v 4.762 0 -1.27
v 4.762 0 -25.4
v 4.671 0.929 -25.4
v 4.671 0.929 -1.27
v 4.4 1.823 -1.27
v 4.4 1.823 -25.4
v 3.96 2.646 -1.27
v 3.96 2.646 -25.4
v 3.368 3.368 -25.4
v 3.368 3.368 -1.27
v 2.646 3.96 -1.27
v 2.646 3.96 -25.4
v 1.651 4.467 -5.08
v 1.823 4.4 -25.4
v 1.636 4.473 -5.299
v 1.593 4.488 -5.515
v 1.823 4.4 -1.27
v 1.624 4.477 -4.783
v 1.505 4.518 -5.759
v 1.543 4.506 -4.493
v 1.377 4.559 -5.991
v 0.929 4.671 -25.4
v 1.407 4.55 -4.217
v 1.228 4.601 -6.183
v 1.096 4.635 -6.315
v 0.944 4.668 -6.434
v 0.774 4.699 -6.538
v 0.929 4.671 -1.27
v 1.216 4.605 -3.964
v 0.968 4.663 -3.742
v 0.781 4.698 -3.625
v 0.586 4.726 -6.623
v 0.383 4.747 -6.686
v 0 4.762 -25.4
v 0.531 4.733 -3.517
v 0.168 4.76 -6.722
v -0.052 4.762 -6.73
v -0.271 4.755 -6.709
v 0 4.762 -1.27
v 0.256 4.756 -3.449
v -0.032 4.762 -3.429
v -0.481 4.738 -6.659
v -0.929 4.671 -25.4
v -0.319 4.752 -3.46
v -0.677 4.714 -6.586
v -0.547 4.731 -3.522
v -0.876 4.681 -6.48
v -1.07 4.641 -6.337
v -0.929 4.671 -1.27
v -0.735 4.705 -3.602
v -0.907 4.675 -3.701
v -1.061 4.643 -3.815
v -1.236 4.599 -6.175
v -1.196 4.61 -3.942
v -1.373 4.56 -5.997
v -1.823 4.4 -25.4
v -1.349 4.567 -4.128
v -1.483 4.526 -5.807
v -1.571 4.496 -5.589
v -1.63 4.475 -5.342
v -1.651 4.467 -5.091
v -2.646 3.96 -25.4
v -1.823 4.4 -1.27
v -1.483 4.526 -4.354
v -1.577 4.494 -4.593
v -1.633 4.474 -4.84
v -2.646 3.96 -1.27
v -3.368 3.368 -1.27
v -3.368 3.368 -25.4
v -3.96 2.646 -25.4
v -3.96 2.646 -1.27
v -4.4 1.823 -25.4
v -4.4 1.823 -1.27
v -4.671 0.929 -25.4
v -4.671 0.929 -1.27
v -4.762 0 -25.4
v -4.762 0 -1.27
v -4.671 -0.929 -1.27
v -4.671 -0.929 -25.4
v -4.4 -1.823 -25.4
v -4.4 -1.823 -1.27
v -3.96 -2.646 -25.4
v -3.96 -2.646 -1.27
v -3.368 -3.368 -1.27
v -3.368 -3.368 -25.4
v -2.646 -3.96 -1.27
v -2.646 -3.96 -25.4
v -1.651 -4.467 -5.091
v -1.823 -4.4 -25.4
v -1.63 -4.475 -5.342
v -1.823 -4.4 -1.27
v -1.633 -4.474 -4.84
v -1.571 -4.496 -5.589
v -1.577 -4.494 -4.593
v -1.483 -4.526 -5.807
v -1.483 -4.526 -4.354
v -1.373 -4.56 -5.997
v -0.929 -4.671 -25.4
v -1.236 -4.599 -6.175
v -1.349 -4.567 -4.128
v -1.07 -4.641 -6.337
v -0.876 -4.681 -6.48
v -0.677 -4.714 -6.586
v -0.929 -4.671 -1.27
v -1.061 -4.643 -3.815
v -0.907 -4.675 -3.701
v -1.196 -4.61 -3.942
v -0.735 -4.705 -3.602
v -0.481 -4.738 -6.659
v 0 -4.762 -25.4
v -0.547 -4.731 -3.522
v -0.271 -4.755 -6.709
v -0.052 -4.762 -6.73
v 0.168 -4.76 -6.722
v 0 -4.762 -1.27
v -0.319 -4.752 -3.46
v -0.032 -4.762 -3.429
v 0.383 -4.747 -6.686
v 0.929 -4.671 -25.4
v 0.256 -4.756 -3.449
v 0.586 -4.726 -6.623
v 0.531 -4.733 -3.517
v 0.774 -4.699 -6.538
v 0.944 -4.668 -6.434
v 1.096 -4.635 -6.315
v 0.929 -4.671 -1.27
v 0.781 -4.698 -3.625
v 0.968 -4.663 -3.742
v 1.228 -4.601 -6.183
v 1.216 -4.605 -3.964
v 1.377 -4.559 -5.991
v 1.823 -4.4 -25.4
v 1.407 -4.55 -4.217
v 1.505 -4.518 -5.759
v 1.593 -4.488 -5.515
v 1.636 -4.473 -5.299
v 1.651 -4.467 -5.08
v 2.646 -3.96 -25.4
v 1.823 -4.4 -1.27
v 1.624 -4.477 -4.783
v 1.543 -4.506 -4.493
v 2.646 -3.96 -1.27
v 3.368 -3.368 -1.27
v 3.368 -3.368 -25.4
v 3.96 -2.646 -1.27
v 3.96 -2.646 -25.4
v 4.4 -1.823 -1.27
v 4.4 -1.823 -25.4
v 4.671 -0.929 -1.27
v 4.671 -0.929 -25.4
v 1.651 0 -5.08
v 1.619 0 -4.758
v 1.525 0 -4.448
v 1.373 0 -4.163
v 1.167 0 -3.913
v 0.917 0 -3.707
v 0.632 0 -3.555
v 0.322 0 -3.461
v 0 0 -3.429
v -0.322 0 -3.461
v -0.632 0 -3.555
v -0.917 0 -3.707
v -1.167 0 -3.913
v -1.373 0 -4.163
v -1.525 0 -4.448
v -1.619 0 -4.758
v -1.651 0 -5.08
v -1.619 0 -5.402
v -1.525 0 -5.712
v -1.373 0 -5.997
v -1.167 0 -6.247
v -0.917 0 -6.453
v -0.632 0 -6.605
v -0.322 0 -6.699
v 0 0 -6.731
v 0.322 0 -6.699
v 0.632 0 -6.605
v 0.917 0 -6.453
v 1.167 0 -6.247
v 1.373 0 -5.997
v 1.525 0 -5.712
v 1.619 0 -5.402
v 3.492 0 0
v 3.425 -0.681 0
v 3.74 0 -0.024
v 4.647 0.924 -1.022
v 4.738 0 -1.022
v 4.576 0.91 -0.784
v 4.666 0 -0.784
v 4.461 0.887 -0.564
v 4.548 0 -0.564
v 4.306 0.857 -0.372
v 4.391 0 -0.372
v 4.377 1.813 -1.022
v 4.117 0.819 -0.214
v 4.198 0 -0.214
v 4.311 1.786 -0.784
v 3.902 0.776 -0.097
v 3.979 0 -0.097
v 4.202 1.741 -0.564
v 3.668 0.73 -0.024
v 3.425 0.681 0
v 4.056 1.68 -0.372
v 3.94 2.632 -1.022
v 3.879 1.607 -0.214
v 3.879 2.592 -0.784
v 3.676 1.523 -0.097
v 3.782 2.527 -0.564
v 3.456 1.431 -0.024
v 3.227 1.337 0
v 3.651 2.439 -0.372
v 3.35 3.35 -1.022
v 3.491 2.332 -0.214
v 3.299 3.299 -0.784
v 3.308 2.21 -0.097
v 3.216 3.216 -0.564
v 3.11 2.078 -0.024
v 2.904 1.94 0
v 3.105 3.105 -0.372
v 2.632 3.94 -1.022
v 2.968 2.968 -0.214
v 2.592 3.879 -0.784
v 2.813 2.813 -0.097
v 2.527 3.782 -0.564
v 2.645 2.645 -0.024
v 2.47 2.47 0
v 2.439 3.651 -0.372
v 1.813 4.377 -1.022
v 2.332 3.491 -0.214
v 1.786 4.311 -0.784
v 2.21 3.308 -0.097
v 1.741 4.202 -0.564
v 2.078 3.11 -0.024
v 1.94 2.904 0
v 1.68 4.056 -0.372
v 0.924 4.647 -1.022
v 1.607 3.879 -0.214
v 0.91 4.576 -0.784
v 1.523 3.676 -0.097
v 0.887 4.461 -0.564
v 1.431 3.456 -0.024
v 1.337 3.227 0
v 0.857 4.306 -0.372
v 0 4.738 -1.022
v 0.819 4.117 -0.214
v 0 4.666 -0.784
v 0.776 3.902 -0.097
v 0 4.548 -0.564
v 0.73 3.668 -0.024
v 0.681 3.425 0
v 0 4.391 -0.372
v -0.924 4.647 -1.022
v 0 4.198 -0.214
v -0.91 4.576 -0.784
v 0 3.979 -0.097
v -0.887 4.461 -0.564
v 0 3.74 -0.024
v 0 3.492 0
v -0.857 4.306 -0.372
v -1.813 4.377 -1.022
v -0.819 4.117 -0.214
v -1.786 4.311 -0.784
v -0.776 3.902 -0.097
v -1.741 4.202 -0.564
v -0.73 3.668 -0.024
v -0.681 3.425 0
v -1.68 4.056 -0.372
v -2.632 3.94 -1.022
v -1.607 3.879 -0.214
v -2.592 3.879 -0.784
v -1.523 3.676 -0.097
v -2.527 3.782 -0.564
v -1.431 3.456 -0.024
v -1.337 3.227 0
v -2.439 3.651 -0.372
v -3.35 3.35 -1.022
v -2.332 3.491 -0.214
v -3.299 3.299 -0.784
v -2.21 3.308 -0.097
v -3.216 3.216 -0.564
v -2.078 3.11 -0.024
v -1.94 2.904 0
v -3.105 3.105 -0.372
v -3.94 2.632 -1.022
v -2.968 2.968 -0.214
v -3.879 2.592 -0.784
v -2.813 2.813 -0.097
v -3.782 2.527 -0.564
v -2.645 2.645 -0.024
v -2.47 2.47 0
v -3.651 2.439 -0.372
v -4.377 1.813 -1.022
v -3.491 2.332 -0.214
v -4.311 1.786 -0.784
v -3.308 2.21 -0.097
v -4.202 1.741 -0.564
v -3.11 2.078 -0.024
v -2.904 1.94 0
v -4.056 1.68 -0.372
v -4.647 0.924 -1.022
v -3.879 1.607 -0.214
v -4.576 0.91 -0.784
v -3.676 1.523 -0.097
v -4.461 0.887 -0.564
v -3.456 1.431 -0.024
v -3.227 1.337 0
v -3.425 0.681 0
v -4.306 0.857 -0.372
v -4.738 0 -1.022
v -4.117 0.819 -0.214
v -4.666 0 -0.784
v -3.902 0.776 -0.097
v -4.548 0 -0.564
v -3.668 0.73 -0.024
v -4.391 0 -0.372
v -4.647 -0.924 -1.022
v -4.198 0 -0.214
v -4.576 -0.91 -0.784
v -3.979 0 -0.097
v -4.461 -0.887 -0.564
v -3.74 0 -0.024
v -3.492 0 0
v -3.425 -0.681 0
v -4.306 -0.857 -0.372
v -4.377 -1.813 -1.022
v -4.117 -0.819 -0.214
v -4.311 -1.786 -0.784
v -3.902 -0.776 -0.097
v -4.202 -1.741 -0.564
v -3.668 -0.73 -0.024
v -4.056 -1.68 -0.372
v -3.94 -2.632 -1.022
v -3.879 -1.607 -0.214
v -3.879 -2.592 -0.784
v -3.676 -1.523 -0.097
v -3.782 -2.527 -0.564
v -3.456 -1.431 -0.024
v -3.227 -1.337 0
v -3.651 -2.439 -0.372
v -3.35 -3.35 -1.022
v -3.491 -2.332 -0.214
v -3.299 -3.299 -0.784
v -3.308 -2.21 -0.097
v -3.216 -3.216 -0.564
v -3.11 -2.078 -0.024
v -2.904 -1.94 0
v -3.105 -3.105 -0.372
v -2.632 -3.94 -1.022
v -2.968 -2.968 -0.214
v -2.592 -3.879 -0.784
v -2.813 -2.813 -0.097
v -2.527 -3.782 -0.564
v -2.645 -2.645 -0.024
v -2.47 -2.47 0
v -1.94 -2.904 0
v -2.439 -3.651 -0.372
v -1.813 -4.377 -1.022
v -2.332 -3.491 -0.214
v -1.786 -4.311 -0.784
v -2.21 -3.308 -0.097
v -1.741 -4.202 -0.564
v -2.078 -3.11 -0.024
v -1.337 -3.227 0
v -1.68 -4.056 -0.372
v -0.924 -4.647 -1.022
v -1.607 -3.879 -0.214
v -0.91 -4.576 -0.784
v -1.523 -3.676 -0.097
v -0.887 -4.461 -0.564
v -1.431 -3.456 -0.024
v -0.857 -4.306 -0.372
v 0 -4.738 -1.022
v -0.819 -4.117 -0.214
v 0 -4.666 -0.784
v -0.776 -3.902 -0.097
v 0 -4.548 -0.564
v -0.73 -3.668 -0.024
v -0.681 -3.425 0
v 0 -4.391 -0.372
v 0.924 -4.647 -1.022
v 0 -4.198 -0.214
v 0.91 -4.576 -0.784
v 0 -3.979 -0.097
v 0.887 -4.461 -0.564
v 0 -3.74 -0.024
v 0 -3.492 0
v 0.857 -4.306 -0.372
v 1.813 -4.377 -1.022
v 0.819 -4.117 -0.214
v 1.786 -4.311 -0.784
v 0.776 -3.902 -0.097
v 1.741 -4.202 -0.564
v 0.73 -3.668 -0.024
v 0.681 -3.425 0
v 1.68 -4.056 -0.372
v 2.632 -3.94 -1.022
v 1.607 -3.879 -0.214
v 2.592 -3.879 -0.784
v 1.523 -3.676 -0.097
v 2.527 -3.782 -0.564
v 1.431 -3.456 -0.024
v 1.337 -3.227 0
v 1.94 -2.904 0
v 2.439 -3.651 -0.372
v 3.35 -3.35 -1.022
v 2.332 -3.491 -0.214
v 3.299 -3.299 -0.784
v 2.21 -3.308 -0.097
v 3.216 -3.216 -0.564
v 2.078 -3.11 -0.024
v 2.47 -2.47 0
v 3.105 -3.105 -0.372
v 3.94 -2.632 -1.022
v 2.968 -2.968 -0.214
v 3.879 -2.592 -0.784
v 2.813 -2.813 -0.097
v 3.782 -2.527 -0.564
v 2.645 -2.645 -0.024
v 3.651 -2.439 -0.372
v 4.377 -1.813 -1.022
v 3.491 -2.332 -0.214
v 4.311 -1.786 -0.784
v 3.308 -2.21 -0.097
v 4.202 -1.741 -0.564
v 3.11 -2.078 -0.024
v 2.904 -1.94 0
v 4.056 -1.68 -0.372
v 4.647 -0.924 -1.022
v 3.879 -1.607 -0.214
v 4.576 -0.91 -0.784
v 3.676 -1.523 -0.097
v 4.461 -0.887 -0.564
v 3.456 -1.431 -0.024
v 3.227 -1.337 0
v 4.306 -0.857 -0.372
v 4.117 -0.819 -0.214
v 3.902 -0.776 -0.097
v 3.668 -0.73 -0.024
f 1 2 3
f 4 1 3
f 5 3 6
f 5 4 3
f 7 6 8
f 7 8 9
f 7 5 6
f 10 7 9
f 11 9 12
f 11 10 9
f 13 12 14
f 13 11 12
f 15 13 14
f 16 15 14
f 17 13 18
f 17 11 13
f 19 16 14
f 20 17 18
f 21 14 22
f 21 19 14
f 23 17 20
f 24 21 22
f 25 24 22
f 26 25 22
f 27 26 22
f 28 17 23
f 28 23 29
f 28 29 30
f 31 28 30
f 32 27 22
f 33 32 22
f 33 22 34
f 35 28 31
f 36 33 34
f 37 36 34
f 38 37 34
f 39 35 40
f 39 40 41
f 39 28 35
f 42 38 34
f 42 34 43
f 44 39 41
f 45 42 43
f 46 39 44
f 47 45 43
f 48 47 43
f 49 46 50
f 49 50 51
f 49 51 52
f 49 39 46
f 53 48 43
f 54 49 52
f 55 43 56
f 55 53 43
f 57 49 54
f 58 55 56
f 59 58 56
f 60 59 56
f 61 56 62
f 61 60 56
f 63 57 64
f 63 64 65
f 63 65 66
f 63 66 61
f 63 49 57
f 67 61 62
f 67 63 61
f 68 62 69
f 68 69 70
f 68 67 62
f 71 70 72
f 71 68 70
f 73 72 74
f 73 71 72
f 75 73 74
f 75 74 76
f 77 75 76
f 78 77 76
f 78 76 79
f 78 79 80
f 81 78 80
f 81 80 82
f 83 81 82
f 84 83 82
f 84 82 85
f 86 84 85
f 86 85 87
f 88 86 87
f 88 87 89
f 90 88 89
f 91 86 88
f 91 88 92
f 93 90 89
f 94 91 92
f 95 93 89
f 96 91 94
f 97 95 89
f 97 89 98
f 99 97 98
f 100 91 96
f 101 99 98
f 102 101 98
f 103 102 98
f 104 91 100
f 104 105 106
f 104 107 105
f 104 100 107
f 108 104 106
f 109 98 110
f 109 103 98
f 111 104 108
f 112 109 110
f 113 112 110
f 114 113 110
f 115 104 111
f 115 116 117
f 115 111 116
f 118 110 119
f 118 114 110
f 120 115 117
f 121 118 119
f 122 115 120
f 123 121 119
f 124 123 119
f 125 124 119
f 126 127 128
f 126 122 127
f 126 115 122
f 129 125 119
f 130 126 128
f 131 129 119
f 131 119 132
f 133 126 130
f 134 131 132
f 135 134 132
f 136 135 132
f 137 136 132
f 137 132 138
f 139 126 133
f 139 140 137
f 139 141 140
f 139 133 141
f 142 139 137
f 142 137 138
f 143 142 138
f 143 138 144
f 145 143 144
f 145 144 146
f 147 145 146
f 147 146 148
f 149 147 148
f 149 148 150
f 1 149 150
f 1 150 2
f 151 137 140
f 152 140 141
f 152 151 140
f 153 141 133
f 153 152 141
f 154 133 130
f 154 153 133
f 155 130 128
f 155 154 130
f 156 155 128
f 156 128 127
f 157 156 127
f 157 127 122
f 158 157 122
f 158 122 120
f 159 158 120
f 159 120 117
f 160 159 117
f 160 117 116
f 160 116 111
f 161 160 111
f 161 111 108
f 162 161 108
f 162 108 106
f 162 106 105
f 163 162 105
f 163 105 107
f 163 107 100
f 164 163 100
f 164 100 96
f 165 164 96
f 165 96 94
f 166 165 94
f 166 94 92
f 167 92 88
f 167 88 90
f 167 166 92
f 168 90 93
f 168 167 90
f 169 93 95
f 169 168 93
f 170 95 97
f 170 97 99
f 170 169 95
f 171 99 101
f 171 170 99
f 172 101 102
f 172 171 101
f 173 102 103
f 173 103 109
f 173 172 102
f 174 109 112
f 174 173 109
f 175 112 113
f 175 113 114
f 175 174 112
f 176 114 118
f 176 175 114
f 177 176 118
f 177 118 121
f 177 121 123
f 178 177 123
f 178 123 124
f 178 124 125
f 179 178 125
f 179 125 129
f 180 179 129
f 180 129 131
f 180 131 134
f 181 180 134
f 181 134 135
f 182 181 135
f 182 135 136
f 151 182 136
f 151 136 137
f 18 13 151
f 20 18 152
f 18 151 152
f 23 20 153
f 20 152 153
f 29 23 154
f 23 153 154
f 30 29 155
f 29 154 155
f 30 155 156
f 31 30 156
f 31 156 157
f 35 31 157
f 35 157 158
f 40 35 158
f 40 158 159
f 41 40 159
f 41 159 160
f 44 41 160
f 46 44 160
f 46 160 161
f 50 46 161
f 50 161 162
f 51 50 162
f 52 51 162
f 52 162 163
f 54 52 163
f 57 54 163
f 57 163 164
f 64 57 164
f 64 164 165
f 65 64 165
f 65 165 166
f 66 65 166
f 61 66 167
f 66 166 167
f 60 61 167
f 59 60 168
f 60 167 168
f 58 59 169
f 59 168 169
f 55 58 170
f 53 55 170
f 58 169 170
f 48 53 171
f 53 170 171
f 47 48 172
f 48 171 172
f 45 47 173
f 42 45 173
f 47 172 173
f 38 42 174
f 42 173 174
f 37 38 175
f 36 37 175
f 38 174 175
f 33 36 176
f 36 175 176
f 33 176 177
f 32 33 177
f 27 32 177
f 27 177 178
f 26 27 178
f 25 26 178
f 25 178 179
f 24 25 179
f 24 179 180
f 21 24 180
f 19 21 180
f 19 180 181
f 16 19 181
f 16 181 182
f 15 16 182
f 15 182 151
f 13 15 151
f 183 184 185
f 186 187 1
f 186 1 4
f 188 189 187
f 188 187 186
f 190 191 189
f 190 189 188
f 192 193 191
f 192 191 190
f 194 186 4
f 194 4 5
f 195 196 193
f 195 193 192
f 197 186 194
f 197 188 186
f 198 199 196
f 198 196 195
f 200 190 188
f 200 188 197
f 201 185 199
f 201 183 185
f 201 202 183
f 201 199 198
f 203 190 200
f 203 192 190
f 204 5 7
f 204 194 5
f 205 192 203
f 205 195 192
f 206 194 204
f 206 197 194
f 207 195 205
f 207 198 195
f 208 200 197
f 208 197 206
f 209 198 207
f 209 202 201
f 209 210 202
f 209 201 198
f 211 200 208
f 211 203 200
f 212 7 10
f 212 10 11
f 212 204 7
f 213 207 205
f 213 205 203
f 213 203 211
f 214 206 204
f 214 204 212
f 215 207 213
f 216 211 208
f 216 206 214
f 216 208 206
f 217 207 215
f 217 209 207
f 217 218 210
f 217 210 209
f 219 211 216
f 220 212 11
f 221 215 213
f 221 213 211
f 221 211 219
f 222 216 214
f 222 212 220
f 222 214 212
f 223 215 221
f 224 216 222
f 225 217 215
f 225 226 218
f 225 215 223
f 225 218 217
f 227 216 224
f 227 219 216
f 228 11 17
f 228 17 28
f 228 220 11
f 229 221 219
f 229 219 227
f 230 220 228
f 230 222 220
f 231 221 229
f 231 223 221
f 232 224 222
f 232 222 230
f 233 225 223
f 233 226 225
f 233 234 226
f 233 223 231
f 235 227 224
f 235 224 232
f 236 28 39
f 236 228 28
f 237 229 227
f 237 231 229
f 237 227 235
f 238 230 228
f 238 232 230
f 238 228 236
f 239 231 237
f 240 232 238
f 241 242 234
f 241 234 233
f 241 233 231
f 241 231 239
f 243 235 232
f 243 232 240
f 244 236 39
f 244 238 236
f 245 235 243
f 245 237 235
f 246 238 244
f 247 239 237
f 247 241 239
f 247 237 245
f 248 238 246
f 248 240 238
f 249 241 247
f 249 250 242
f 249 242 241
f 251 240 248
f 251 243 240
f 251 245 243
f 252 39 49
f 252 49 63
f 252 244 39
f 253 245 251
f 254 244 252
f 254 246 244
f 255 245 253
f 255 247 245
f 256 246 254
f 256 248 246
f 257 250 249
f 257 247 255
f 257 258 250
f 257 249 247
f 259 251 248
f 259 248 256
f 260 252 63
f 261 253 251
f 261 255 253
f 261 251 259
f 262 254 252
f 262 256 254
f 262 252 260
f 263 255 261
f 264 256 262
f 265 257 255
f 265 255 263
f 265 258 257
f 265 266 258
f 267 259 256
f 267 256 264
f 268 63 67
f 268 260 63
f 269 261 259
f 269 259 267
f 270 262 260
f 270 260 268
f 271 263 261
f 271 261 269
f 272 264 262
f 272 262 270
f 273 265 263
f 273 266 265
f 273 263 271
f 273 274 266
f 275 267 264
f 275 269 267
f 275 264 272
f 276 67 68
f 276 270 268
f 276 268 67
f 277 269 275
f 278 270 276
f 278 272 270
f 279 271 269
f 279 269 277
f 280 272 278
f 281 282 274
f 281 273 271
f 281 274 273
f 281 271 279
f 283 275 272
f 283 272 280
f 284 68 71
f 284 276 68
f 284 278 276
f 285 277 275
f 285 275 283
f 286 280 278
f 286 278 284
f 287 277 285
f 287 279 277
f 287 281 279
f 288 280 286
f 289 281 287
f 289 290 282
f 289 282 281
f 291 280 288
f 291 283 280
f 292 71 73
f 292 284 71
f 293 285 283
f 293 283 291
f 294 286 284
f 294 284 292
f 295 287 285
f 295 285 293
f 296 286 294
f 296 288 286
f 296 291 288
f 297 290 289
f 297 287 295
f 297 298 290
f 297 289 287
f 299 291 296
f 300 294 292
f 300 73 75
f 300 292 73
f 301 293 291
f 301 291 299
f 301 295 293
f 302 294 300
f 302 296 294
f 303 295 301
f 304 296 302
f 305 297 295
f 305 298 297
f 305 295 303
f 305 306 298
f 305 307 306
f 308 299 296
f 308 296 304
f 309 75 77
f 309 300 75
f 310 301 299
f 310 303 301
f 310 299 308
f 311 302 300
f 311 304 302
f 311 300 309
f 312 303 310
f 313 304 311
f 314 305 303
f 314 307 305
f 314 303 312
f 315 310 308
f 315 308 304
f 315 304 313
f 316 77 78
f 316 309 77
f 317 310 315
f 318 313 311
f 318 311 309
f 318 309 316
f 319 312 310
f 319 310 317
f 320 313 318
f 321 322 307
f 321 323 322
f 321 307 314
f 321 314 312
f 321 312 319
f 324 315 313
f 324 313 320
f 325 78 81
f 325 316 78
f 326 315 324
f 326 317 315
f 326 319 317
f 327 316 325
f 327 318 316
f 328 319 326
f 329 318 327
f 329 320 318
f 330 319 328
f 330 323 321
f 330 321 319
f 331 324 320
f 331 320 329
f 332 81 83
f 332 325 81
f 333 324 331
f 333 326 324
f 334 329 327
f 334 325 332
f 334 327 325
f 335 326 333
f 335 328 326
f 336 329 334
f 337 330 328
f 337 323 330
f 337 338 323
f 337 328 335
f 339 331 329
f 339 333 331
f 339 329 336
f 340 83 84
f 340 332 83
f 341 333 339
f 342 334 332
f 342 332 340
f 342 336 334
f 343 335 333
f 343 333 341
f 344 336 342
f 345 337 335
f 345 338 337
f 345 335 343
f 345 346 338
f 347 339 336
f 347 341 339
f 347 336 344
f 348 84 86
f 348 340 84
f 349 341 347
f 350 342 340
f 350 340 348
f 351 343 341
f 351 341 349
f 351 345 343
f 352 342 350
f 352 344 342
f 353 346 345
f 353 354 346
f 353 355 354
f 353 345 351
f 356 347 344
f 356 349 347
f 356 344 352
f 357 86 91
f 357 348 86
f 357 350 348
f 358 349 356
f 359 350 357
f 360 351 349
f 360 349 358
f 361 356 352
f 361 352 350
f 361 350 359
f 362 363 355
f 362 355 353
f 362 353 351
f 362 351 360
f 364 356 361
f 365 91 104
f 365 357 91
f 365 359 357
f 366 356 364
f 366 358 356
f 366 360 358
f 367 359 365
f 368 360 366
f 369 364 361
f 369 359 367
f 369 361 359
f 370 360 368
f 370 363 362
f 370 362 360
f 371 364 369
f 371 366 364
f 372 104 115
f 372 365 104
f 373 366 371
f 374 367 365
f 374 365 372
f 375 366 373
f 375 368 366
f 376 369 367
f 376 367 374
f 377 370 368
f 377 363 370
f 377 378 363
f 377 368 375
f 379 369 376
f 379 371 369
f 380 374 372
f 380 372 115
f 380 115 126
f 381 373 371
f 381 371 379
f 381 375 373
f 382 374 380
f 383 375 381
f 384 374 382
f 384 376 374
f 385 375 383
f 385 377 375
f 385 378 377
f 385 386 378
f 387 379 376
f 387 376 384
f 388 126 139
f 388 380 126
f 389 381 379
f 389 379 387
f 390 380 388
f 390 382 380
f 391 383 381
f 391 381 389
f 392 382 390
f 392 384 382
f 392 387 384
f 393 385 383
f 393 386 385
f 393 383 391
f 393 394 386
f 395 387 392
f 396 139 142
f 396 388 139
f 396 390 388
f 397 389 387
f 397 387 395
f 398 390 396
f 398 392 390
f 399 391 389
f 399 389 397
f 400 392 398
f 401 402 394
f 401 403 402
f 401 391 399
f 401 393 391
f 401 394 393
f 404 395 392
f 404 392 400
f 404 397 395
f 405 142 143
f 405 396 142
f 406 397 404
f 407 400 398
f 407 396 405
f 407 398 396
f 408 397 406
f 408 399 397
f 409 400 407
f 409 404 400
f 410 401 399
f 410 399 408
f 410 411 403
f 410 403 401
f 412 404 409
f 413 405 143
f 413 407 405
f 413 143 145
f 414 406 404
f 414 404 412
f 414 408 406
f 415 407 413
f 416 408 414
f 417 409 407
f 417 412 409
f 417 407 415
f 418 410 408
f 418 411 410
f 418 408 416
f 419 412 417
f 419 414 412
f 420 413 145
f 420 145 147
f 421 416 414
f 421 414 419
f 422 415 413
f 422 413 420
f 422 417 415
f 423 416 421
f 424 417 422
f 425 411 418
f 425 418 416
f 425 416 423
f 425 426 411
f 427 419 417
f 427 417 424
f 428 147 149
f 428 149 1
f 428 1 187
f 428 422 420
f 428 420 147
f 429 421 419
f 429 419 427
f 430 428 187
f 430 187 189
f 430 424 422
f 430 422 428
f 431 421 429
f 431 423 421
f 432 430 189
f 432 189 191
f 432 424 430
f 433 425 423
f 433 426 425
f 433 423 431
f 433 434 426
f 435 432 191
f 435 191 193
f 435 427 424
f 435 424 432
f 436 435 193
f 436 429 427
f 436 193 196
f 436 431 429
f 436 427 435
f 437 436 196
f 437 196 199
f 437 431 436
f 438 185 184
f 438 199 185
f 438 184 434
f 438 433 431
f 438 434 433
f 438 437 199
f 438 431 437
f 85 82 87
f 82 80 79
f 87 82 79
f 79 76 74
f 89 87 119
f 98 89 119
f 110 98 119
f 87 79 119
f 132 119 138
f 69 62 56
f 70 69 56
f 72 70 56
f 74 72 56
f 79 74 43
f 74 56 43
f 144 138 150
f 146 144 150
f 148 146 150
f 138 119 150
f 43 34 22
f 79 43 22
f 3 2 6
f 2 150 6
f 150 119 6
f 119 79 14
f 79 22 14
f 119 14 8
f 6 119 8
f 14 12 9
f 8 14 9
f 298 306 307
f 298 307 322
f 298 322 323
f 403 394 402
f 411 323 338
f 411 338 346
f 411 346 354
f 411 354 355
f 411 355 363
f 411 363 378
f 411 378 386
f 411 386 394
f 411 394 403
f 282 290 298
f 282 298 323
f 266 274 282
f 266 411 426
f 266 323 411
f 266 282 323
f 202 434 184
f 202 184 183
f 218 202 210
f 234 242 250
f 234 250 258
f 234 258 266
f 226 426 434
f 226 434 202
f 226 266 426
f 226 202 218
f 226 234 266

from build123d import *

# Parameters (mm, degrees)
F0_R          = 4.7625
F1_DEPTH      = 25.4
F2_R          = 1.651
F3_DEPTH      = 4.7635
F3_DEPTH_BACK = 25.4
F4_R          = 1.27


with BuildPart() as f1:
    # F0 (on Top) → F1 (new body)
    with BuildSketch(Plane.XY):
        Circle(F0_R)
    extrude(amount=-F1_DEPTH)

    # F2 (on Front) → F3 (cut, two sides)
    with BuildSketch(Plane.XZ) as f3_sk:
        with Locations((0, -5.08)):
            Circle(F2_R)
    extrude(amount=-F3_DEPTH, mode=Mode.SUBTRACT)
    extrude(f3_sk.sketch, amount=F3_DEPTH_BACK, mode=Mode.SUBTRACT)

    # F4
    f4_edges = [f1.edges().sort_by_distance(p)[0] for p in [
        (-4.7625, 0, 0),
    ]]
    fillet(f4_edges, radius=F4_R)


solid = f1.part
